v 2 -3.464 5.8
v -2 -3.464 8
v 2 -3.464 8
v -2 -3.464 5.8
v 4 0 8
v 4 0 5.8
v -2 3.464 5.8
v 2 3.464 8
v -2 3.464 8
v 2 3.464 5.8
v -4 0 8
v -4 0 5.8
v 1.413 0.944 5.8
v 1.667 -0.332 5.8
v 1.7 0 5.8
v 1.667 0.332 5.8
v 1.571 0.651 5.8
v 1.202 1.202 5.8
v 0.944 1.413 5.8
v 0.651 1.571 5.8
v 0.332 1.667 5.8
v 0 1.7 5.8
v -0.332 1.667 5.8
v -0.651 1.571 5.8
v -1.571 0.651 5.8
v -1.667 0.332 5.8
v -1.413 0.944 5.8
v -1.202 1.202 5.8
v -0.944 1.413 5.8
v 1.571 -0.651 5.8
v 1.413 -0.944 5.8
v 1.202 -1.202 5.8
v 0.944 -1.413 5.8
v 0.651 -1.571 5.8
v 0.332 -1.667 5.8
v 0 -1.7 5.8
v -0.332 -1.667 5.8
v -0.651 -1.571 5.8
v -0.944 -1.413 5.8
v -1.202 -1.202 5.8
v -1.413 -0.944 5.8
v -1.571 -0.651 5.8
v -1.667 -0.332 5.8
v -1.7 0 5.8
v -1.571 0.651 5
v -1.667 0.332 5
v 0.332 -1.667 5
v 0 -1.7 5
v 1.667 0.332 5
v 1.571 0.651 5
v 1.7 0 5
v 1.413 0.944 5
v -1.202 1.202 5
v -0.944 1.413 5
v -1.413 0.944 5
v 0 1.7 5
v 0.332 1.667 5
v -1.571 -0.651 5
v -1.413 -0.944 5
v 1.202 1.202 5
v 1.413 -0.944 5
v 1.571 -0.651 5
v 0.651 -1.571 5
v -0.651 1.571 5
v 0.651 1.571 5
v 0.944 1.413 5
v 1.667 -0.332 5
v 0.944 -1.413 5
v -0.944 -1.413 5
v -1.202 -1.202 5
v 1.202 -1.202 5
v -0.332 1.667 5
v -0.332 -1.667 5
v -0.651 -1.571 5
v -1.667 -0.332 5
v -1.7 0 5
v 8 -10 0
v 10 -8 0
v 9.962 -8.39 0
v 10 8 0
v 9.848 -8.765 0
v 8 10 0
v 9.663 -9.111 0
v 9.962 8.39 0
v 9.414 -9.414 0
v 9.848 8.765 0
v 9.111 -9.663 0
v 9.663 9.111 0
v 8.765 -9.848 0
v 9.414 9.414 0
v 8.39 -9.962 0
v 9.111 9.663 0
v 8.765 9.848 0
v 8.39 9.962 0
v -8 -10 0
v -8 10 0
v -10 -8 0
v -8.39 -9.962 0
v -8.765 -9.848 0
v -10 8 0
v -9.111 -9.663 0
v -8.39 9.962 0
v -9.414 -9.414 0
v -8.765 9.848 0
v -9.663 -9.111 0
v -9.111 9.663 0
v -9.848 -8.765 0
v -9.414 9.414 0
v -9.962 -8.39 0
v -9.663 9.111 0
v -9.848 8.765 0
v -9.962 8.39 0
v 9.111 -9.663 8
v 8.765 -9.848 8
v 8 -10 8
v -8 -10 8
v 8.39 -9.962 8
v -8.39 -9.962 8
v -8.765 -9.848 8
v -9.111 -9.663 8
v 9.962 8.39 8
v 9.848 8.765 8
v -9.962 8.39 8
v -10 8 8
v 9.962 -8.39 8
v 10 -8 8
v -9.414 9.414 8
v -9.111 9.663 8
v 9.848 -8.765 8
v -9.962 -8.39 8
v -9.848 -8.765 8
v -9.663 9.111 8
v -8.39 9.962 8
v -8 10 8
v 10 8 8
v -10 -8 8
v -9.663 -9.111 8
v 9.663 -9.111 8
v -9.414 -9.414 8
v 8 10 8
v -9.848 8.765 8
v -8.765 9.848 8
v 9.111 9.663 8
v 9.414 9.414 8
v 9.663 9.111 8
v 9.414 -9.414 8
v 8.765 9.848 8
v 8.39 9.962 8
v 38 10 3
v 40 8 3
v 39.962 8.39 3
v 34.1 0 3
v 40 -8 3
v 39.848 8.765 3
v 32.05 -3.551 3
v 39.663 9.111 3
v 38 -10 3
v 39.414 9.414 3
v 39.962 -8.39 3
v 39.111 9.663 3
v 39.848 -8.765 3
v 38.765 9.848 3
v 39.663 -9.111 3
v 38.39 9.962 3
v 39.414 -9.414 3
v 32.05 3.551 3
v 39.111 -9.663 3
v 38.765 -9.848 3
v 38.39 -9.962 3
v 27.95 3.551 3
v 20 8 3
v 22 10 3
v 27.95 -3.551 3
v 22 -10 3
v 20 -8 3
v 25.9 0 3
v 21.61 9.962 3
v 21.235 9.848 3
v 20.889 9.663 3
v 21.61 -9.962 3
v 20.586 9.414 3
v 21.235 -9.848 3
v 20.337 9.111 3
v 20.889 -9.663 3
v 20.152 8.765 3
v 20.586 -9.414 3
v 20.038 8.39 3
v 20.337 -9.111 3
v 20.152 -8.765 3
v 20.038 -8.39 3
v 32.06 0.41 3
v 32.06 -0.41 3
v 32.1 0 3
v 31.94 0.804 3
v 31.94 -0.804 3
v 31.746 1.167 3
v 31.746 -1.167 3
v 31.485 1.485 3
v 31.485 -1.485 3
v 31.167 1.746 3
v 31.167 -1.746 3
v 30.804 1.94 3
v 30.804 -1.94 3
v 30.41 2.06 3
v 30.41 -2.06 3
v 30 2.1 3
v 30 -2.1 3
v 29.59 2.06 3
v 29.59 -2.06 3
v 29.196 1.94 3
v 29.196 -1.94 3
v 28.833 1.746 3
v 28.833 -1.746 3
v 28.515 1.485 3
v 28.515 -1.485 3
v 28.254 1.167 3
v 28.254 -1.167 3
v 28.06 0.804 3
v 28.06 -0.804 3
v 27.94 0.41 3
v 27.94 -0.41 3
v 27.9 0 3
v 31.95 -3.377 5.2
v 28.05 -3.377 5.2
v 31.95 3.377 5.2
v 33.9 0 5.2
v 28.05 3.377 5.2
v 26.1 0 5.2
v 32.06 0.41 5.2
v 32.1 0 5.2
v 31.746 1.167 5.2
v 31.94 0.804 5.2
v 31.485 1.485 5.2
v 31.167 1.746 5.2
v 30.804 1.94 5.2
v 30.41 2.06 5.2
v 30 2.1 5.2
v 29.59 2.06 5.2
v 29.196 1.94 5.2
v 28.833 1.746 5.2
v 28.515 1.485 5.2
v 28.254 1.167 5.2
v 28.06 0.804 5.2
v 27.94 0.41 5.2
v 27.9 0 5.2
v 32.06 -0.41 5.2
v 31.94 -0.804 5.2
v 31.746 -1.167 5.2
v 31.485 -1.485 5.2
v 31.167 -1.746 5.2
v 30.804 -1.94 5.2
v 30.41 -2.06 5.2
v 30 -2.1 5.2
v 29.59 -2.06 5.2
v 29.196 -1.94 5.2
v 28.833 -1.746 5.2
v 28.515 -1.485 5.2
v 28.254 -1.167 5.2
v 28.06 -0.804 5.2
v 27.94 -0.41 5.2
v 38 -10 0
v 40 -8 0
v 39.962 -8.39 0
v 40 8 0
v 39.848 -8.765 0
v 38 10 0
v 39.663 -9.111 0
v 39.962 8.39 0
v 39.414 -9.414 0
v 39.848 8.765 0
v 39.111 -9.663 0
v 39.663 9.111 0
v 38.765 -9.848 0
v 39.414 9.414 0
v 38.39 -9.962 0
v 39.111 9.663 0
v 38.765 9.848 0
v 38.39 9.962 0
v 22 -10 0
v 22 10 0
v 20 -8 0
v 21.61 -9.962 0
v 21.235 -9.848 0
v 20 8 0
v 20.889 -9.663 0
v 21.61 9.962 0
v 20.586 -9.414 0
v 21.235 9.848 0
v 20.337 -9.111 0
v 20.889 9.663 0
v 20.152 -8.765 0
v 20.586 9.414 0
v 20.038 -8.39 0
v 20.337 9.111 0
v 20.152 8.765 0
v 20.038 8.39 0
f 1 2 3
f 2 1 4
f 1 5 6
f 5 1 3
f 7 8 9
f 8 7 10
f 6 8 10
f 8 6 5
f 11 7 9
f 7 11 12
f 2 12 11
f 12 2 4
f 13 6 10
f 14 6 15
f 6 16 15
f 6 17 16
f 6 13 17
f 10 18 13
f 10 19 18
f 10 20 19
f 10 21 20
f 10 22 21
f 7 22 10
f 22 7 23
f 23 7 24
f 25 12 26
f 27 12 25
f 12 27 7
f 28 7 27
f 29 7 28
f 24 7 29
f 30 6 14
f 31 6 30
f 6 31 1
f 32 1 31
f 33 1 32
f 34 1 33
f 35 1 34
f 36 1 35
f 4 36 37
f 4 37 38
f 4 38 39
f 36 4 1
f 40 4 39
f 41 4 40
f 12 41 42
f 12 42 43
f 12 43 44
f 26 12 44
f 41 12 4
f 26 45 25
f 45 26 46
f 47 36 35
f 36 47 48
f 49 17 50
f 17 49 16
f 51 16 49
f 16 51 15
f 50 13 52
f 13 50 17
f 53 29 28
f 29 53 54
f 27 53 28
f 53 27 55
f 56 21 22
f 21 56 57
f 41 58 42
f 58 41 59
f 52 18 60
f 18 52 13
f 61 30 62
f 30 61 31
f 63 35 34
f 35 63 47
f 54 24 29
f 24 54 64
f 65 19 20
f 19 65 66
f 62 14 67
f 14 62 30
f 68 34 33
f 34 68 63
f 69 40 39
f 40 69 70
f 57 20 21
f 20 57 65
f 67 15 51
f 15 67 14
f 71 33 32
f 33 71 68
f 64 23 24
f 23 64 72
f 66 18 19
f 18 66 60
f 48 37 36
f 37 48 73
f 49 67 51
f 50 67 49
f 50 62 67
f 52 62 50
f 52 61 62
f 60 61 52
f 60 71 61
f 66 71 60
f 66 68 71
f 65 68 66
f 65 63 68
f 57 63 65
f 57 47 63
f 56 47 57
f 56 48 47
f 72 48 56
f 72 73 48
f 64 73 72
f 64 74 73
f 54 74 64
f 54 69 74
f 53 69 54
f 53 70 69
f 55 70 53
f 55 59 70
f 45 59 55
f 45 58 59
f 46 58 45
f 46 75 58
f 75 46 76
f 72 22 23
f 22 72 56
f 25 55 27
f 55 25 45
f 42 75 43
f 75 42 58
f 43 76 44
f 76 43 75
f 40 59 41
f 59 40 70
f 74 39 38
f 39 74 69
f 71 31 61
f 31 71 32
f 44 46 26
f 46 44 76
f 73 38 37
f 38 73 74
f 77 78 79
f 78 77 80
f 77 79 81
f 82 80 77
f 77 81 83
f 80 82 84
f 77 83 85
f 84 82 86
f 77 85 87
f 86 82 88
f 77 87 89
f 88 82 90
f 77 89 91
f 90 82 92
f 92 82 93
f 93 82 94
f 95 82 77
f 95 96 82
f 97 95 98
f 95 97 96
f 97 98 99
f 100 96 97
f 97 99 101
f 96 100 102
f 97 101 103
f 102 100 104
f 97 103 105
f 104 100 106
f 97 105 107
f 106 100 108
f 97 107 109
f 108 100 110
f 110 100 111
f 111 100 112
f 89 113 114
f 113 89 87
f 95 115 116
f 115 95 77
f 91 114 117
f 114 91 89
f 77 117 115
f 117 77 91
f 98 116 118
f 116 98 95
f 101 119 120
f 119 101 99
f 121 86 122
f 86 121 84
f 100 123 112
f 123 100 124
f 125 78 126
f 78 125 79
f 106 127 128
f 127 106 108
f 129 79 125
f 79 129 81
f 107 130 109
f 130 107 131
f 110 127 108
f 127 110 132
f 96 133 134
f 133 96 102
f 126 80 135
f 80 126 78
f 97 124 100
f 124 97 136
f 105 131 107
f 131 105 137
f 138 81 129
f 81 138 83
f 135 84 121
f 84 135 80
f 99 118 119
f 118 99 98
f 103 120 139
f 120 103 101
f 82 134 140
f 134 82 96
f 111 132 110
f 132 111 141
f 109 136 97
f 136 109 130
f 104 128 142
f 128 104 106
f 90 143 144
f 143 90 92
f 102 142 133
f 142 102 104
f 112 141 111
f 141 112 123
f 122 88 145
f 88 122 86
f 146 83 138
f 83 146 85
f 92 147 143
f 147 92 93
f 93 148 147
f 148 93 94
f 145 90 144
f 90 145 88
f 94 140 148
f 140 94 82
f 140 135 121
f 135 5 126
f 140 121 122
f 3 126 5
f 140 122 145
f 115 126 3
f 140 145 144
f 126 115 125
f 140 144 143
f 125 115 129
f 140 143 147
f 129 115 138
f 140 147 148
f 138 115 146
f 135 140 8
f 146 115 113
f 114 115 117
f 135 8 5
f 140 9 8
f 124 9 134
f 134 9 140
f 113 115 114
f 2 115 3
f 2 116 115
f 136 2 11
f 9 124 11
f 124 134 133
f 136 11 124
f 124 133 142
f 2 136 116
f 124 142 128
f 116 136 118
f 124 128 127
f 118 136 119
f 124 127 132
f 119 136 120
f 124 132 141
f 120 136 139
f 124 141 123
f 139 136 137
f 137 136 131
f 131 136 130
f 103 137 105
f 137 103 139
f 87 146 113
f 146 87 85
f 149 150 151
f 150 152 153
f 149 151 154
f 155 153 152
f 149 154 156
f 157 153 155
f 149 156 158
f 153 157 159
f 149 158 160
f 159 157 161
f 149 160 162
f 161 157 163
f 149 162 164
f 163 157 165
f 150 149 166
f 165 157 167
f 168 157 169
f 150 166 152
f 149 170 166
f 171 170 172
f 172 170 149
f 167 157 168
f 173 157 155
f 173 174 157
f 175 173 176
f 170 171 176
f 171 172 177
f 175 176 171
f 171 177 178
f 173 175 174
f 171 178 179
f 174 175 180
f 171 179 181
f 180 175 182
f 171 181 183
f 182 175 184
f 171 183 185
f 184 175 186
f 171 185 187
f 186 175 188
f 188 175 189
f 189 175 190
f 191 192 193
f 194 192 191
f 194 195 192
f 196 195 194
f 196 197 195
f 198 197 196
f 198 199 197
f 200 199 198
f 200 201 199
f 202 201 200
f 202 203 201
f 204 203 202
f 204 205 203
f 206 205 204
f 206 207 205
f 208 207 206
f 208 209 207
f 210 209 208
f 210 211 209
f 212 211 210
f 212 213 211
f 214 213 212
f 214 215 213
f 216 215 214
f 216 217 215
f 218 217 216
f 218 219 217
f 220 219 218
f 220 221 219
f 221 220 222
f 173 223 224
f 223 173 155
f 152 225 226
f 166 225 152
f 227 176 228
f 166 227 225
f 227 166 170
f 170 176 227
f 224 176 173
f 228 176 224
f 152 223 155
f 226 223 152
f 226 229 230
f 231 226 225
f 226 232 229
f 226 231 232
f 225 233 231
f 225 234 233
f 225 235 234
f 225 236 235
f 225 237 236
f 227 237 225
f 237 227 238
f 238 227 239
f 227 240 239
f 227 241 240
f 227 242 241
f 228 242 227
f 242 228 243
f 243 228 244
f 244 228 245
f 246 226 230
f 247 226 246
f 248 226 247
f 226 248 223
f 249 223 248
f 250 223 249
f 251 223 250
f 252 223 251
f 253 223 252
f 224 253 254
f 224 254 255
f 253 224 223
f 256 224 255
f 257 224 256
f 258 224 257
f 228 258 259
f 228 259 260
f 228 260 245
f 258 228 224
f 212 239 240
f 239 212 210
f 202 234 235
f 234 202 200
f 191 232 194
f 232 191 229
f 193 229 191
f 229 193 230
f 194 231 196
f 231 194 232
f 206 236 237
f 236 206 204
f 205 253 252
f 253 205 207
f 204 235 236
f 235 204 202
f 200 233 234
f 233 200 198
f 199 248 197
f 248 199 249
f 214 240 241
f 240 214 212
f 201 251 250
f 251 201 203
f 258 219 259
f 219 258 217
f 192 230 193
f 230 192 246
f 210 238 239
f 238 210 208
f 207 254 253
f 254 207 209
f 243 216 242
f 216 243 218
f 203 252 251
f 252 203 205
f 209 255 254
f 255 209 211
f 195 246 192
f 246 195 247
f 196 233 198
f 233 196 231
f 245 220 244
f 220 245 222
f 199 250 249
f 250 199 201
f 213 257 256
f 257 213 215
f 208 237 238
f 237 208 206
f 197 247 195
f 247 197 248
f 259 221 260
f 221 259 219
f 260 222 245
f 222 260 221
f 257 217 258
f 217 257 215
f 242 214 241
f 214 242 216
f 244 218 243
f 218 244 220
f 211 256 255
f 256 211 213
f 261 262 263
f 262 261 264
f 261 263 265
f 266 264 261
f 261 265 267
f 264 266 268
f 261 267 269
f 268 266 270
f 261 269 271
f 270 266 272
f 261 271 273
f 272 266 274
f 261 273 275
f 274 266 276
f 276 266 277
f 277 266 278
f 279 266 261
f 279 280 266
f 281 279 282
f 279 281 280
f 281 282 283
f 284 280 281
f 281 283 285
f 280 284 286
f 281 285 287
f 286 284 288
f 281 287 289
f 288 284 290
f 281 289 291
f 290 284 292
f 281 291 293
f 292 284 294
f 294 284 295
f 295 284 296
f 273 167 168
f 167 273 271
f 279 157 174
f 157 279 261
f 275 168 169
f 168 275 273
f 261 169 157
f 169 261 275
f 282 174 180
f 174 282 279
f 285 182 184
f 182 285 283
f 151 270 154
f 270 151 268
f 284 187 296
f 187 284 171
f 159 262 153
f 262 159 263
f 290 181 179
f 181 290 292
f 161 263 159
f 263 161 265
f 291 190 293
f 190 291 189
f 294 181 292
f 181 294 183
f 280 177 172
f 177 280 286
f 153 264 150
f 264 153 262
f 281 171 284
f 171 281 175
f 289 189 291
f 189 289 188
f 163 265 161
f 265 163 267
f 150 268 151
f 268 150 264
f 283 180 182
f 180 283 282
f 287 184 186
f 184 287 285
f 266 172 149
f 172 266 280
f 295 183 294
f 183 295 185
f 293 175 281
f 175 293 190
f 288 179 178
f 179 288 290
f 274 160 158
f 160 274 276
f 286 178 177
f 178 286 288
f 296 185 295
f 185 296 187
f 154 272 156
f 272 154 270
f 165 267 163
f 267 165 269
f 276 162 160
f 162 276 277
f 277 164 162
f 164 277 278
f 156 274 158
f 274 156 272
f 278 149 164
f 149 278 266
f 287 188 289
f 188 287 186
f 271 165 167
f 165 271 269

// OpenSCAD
// file: ../source/rm_common.scad
// RobotMind's sole interface: blind hex port, hollow hex peg, optional M3 lock.
$fn = 32;

RM_EPS = 0.1;
RM_PLATE = 80;
RM_GRID = 10;
RM_PLATE_T = 8;
RM_PORT_INSET = 5;
RM_PORT_OD = 8;
RM_PORT_DEPTH = 2.2;
RM_INSERT_BORE = 3.4; // for an M3x3x4 heat-set insert
RM_INSERT_DEPTH = 3;
RM_PEG_ENTRY = 0.2;
RM_PEG_GRIP = 0.2;
RM_PEG_BORE = 4.2;   // clears the seated insert
RM_M3_CLEARANCE = 3.4;
RM_M3_HEAD_D = 6.2;
RM_JOIN_T = 4;
RM_JOIN_L = RM_PLATE;

function port_position(i) = -RM_PLATE/2 + RM_PORT_INSET + i*RM_GRID;
function join_columns() = [-25,-5,5,25];
function peg_root_od() = RM_PORT_OD + RM_PEG_GRIP;
function peg_tip_od() = RM_PORT_OD - RM_PEG_ENTRY;

assert(RM_PLATE_T - 2*RM_INSERT_DEPTH >= 2,
       "Opposing blind insert bores need a centre membrane");
assert(peg_root_od() > RM_PORT_OD && RM_PORT_OD > peg_tip_od(),
       "Peg needs a lead-in and final grip");

module rounded_box(size=[20,20,3], r=2) {
  linear_extrude(height=size[2])
    offset(r=r) offset(delta=-r) square([size[0],size[1]]);
}

module blind_port_cut() {
  translate([0,0,-RM_EPS]) cylinder(h=RM_PORT_DEPTH+RM_EPS,d=RM_PORT_OD,$fn=6);
  translate([0,0,-RM_EPS]) cylinder(h=RM_INSERT_DEPTH+RM_EPS,d=RM_INSERT_BORE);
}

module plate_port_cuts(top=false) {
  for(x=[0:7], y=[0:7])
    if(top)
      translate([port_position(x),port_position(y),RM_PLATE_T])
        mirror([0,0,1]) blind_port_cut();
    else
      translate([port_position(x),port_position(y),0]) blind_port_cut();
}

module plate_8x8() {
  difference() {
    translate([-RM_PLATE/2,-RM_PLATE/2,0])
      rounded_box([RM_PLATE,RM_PLATE,RM_PLATE_T],3);
    plate_port_cuts();
    plate_port_cuts(top=true);
  }
}

module mount_peg() {
  difference() {
    cylinder(h=RM_PORT_DEPTH,d1=peg_root_od(),d2=peg_tip_od(),$fn=6);
    translate([0,0,-RM_EPS]) cylinder(h=RM_PORT_DEPTH+2*RM_EPS,d=RM_PEG_BORE);
  }
}

module top_screw_cut() {
  translate([0,0,-RM_PORT_DEPTH-RM_EPS])
    cylinder(h=RM_JOIN_T+RM_PORT_DEPTH+2*RM_EPS,d=RM_M3_CLEARANCE);
  translate([0,0,RM_JOIN_T-2]) cylinder(h=2+RM_EPS,d=RM_M3_HEAD_D);
}

module side_screw_cut() {
  translate([0,-RM_JOIN_T-RM_EPS,0]) rotate([-90,0,0])
    cylinder(h=RM_JOIN_T+RM_EPS,d=RM_M3_CLEARANCE);
  translate([0,-RM_JOIN_T-RM_EPS,0]) rotate([-90,0,0])
    cylinder(h=2+RM_EPS,d=RM_M3_HEAD_D);
}
// main file
include <../source/rm_common.scad>

// Actual blind port and actual hollow peg; print this before the full set.
difference() {
  translate([-10,-10,0]) rounded_box([20,20,RM_PLATE_T],2);
  translate([0,0,RM_PLATE_T]) mirror([0,0,1]) blind_port_cut();
}
translate([20,-10,0]) rounded_box([20,20,3],2);
translate([30,0,3]) mount_peg();
